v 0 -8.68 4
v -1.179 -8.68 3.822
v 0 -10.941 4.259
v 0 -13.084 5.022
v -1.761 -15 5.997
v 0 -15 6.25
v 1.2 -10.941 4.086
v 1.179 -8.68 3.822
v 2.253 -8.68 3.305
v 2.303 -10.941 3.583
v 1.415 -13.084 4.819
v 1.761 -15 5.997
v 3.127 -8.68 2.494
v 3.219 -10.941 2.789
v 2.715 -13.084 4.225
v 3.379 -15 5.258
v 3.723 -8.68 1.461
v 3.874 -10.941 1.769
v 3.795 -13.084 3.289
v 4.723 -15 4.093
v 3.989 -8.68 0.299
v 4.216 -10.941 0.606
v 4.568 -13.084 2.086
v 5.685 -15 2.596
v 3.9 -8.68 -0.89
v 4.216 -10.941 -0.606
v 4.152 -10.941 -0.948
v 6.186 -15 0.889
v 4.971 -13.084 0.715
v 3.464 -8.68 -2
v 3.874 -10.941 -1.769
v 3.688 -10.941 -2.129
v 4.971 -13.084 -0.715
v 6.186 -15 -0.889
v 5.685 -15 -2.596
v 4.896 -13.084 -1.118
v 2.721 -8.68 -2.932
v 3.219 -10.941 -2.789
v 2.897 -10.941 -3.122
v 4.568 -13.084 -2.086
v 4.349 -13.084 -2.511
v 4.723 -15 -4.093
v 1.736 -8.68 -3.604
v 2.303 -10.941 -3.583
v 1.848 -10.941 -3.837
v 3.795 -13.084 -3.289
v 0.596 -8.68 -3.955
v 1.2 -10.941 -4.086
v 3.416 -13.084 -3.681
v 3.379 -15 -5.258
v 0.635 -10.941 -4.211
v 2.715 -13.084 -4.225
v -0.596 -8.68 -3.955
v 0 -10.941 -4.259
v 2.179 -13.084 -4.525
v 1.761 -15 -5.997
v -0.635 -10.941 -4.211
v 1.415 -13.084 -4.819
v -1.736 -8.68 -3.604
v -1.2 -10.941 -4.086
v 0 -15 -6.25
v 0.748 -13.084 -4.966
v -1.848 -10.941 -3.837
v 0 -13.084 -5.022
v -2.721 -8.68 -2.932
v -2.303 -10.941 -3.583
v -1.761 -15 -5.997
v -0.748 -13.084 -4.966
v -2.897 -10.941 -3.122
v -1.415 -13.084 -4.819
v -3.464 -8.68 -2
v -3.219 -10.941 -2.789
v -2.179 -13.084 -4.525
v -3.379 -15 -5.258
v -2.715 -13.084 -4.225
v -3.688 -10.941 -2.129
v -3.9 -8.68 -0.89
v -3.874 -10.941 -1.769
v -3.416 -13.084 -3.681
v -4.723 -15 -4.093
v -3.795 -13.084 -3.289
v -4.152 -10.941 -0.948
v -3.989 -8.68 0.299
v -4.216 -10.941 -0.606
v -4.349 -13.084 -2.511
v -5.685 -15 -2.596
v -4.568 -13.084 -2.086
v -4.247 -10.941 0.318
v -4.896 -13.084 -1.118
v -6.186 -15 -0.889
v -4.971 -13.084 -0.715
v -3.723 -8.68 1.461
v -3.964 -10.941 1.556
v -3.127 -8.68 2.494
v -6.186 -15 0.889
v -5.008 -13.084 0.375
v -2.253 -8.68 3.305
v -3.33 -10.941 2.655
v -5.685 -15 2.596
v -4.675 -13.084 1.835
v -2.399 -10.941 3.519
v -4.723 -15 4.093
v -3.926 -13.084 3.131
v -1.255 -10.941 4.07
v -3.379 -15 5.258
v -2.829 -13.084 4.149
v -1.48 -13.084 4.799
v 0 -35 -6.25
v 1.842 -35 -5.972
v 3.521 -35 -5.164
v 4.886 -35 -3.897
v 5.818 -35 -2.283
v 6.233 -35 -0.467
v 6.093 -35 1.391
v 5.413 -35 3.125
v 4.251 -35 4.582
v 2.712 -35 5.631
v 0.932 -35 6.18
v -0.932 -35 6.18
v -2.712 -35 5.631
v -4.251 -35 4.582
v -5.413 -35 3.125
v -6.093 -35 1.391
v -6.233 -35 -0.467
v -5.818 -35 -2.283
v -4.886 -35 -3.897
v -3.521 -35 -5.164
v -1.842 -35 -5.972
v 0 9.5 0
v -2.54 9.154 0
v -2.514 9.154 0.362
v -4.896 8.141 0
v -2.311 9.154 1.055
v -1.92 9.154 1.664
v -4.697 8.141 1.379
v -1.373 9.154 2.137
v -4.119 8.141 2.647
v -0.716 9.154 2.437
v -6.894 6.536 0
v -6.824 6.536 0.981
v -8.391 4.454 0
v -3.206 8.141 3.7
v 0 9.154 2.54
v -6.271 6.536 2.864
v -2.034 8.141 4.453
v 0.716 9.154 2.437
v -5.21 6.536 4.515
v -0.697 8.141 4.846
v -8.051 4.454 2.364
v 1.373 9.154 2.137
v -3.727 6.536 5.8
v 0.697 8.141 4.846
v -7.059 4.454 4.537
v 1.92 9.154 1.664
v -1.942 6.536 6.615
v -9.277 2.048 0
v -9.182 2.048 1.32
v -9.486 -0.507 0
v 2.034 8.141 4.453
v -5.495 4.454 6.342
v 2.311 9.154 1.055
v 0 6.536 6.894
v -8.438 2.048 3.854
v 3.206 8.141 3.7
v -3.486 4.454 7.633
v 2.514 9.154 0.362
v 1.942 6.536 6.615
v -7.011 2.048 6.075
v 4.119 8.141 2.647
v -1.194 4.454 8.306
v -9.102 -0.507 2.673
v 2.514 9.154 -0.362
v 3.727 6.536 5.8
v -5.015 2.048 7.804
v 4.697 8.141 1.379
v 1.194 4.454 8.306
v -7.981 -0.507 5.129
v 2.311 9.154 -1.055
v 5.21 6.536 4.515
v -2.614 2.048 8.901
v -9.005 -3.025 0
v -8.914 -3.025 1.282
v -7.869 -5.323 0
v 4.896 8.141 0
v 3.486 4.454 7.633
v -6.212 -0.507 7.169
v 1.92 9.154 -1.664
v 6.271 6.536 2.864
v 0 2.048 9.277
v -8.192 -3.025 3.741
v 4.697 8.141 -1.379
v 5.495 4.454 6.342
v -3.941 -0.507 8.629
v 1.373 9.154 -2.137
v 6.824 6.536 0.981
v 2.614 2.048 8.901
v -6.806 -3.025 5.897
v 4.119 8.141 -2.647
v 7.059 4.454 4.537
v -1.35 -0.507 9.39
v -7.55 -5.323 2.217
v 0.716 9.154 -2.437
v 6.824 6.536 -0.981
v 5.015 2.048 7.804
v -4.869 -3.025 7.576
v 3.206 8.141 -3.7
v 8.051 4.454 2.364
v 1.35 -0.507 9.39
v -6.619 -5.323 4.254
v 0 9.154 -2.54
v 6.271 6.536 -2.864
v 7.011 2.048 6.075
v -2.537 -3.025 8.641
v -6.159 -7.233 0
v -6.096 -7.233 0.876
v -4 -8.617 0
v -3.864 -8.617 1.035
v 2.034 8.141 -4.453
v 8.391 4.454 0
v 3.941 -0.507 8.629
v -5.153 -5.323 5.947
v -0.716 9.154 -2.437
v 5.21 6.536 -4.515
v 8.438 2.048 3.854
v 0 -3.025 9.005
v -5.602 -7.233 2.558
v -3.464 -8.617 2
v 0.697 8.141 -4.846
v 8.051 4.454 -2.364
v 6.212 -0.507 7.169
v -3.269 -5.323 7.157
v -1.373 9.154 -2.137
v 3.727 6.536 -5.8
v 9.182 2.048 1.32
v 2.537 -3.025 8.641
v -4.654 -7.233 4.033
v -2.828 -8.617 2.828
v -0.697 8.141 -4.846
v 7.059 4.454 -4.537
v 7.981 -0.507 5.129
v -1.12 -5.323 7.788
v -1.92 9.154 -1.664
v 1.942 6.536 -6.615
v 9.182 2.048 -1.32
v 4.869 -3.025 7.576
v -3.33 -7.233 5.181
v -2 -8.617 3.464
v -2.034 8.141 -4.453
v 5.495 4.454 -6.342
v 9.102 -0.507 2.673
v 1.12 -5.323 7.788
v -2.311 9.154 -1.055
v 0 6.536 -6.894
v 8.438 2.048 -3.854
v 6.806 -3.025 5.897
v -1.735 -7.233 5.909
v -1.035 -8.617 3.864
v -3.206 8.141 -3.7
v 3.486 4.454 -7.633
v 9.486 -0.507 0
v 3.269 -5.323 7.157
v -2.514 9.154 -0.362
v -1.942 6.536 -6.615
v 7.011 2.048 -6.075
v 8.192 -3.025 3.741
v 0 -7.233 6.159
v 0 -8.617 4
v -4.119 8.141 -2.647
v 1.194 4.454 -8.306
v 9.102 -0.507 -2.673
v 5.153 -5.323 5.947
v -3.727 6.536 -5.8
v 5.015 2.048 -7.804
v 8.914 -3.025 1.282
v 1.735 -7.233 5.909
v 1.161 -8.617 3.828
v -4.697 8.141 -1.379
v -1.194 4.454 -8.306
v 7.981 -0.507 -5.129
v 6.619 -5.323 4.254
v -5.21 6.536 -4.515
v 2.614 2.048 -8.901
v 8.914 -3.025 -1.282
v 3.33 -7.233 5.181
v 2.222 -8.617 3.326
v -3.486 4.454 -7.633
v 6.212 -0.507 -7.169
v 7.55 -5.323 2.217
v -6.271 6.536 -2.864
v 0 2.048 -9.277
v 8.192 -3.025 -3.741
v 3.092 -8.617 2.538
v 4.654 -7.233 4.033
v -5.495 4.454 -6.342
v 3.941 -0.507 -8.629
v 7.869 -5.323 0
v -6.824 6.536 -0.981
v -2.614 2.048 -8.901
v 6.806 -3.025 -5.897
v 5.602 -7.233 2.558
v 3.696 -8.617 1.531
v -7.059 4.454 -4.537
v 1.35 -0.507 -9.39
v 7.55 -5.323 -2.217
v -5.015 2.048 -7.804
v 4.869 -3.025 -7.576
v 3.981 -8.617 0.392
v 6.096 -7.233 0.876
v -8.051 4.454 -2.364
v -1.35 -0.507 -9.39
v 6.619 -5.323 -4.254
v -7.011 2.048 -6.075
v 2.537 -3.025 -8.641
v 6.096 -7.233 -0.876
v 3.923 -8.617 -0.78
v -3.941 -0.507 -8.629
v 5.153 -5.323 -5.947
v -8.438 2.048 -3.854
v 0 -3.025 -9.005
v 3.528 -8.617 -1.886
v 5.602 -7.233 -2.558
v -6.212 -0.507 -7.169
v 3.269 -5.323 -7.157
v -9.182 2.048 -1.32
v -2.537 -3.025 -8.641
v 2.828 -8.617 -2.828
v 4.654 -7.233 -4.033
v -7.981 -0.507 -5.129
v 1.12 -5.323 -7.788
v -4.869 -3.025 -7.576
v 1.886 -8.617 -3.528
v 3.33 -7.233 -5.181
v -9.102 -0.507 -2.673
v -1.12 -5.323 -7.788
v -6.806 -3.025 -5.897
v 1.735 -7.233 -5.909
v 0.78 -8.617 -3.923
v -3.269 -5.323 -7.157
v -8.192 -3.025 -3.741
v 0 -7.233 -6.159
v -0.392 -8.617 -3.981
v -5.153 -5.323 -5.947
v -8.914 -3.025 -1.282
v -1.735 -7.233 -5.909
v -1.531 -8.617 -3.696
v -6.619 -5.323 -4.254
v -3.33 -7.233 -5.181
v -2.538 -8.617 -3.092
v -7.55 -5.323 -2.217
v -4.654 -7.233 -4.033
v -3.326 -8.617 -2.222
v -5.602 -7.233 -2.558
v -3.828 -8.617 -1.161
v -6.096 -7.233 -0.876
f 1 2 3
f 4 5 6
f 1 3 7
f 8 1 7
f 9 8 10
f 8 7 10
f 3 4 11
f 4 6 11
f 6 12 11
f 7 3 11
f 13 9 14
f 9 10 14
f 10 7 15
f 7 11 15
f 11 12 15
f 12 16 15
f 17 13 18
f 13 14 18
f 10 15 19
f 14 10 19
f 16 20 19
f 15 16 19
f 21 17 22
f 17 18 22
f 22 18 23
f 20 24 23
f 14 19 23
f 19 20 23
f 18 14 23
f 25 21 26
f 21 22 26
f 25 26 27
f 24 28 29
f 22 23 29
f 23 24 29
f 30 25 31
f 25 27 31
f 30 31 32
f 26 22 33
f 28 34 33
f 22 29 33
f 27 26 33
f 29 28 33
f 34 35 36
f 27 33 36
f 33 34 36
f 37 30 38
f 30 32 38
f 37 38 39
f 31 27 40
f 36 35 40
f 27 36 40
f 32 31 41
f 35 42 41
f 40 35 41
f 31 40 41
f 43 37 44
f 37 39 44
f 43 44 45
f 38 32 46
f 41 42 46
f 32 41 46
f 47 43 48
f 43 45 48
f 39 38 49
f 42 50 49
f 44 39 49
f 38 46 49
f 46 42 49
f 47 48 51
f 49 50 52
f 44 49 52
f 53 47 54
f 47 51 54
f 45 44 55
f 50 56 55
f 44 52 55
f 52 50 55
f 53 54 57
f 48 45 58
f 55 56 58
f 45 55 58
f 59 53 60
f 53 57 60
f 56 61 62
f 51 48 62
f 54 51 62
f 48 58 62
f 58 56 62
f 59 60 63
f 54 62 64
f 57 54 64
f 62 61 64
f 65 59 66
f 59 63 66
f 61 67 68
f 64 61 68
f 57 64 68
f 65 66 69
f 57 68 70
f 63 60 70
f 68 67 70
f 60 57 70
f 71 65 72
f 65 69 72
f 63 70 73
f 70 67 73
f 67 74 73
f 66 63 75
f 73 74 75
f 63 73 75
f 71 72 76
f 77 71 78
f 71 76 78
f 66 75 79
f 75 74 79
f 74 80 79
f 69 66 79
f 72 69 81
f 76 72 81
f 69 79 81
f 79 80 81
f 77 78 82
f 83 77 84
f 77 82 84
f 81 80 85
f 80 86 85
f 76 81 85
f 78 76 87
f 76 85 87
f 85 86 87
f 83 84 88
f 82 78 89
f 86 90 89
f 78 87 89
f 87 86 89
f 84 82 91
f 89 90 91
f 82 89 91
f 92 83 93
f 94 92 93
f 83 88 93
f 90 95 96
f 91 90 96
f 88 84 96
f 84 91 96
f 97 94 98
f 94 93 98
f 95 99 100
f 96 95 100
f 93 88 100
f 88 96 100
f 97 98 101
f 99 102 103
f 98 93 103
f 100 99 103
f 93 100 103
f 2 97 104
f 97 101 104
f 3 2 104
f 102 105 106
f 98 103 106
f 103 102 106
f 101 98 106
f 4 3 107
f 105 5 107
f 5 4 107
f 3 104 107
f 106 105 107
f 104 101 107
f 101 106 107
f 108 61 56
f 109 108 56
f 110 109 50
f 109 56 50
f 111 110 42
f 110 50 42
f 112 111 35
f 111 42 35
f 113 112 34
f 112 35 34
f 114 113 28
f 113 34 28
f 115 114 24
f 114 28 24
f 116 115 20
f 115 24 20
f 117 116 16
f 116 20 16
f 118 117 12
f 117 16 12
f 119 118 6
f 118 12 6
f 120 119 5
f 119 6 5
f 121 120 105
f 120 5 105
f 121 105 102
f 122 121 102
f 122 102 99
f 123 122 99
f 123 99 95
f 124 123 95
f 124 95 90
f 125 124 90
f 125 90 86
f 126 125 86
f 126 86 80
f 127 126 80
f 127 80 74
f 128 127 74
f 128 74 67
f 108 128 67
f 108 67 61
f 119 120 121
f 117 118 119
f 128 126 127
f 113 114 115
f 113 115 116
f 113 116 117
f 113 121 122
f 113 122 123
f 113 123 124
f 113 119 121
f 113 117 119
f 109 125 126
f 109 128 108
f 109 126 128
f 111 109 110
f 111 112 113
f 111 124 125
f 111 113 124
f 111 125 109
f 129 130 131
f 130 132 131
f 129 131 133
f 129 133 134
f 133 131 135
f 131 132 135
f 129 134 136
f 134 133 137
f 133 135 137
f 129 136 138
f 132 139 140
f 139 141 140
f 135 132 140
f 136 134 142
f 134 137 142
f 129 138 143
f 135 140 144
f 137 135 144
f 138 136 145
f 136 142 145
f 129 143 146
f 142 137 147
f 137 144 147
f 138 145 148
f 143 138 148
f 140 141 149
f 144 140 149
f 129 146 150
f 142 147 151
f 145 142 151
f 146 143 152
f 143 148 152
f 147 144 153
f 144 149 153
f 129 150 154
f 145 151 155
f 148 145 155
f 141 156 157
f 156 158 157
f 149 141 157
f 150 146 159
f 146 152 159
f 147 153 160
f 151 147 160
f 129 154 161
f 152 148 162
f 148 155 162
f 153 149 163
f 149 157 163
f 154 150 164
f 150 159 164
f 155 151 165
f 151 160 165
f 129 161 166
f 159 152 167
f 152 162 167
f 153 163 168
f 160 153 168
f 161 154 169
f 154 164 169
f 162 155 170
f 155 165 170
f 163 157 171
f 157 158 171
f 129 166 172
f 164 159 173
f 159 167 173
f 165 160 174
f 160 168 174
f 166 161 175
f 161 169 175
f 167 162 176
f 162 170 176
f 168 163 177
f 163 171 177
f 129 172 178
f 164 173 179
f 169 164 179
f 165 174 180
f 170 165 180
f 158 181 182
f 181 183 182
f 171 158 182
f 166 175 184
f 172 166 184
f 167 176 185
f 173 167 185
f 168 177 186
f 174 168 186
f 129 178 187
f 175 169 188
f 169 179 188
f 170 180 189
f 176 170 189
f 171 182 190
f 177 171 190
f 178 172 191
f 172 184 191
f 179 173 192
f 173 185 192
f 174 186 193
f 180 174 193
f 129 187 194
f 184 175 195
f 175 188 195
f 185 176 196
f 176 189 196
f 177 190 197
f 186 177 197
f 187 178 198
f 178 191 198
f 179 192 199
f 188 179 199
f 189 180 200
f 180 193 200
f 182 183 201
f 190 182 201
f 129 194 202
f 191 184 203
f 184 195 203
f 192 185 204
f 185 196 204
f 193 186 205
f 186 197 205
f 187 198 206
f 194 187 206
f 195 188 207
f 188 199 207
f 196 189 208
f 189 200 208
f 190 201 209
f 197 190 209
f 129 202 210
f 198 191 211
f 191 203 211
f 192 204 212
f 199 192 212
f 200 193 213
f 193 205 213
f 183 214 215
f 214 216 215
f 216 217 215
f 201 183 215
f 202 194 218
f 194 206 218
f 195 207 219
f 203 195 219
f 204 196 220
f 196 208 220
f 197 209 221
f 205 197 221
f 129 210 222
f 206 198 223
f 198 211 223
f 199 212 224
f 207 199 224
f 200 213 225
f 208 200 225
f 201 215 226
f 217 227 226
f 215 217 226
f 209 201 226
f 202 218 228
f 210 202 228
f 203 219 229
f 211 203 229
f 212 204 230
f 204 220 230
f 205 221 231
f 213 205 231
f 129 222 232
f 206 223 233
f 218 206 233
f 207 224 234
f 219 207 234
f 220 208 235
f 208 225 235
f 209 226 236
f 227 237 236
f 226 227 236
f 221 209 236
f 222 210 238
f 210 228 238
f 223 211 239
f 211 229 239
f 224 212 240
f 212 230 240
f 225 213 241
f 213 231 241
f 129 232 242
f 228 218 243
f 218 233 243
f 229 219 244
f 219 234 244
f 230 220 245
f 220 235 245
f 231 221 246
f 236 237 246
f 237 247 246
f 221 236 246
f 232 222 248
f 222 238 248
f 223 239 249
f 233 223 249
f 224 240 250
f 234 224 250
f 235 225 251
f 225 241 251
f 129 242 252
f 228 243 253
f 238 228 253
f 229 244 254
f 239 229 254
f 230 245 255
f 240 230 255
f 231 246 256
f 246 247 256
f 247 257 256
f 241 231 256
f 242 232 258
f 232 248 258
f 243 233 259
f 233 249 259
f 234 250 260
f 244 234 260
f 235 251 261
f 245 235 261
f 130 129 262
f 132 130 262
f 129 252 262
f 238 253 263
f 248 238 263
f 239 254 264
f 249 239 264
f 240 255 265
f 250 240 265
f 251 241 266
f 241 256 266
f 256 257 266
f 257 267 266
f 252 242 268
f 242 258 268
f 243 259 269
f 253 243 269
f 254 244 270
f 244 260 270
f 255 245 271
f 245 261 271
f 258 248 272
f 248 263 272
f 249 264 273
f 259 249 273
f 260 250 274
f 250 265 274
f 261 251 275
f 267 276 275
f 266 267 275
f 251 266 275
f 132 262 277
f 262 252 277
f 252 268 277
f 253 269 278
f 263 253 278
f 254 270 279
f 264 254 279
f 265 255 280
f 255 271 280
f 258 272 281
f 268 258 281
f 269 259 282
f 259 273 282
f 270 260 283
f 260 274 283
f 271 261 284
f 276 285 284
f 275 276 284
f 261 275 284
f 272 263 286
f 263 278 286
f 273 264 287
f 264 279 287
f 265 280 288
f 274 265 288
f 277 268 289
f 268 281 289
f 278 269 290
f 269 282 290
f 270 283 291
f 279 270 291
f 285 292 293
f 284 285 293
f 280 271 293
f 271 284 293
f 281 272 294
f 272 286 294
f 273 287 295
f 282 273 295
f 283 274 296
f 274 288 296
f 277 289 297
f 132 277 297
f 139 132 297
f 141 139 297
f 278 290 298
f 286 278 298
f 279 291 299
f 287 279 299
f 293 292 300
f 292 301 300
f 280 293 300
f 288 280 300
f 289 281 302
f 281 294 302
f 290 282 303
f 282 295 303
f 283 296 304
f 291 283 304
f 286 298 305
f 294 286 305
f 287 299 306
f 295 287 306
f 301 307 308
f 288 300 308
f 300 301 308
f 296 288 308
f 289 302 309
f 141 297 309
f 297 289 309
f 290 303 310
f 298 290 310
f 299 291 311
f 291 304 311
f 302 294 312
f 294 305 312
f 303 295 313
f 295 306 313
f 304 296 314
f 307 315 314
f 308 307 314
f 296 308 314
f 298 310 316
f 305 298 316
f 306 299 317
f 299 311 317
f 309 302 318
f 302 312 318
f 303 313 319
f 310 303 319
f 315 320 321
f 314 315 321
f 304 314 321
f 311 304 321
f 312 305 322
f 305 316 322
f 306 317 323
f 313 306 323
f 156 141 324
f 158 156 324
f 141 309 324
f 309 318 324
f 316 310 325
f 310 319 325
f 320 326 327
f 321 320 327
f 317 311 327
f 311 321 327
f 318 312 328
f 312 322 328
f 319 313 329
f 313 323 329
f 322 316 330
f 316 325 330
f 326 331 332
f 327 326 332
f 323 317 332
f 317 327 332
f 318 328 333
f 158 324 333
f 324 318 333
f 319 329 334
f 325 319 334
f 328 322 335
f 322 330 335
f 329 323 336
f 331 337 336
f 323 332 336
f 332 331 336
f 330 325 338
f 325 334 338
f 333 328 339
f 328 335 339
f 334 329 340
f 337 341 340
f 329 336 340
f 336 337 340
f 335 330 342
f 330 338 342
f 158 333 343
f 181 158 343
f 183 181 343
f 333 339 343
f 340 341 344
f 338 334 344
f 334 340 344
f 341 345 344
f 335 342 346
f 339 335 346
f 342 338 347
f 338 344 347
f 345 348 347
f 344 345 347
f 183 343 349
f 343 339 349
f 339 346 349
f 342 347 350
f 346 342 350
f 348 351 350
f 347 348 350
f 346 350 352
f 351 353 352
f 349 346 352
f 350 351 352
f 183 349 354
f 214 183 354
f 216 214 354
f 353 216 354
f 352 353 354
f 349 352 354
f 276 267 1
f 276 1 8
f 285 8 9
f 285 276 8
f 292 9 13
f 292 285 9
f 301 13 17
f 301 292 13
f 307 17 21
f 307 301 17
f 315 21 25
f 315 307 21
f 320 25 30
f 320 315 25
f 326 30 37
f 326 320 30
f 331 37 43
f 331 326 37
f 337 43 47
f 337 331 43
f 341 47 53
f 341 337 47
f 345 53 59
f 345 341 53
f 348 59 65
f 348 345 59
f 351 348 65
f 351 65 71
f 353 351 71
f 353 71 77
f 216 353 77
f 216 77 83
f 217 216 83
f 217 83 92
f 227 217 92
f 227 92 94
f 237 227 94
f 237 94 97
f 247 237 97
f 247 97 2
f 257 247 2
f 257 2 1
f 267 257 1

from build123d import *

# Parameters (mm, degrees)
SKETCH2_R           = 4
BOSS_EXTRUDE1_DEPTH = 15
SKETCH3_R           = 6.25
BOSS_EXTRUDE2_DEPTH = 20
FILLET1_R           = 10


with BuildPart() as part:
    # Sketch1 → Revolve1 (revolve)
    with BuildSketch(Plane.XY):
        with BuildLine():
            Line((0, 0), (0, 9.5))
            ThreePointArc((0, 9.5), (-9.5, 0), (0, -9.5))
            Line((0, -9.5), (0, 0))
        make_face()
    revolve(axis=Axis((0, 0, 0), (0, 1, 0)))

    # Sketch2 → Boss-Extrude1 (add)
    with BuildSketch(Plane(origin=(0, 0, 0), x_dir=(1, 0, 0), z_dir=(0, 1, 0))):
        with Locations(Location((0, 0, 0), (0, 0, 270))):
            Circle(SKETCH2_R)
    extrude(amount=-BOSS_EXTRUDE1_DEPTH)

    # Sketch3 → Boss-Extrude2 (add)
    with BuildSketch(Plane.XZ.offset(15)):
        with Locations(Location((0, 0, 0), (0, 0, 270))):
            Circle(SKETCH3_R)
    extrude(amount=BOSS_EXTRUDE2_DEPTH)

    # Fillet1
    # the kernel refuses this fillet: 10 mm, written as the material it adds along each edge
    with BuildSketch(Plane(origin=(0, -15, 0), x_dir=(0, 0, 1), z_dir=(-1, 0, 0))) as fillet1_piece_1:
        with BuildLine():
            CenterArc((14, 6.31961233), FILLET1_R, 180, 39.194967426)
            Line((4, 6.31961233), (3.8, 6.31961233))
            Line((3.8, 6.31961233), (3.8, 0))
            Line((3.8, 0), (4, -0.2))
            ThreePointArc((4, -0.2), (5.125, -0.2), (6.095, -0.126392247))
            Line((6.095, -0.126392247), (6.25, 0))
        make_face()
    revolve(axis=Axis((0, -15, 0), (0, 1, 0)))


solid = part.part
